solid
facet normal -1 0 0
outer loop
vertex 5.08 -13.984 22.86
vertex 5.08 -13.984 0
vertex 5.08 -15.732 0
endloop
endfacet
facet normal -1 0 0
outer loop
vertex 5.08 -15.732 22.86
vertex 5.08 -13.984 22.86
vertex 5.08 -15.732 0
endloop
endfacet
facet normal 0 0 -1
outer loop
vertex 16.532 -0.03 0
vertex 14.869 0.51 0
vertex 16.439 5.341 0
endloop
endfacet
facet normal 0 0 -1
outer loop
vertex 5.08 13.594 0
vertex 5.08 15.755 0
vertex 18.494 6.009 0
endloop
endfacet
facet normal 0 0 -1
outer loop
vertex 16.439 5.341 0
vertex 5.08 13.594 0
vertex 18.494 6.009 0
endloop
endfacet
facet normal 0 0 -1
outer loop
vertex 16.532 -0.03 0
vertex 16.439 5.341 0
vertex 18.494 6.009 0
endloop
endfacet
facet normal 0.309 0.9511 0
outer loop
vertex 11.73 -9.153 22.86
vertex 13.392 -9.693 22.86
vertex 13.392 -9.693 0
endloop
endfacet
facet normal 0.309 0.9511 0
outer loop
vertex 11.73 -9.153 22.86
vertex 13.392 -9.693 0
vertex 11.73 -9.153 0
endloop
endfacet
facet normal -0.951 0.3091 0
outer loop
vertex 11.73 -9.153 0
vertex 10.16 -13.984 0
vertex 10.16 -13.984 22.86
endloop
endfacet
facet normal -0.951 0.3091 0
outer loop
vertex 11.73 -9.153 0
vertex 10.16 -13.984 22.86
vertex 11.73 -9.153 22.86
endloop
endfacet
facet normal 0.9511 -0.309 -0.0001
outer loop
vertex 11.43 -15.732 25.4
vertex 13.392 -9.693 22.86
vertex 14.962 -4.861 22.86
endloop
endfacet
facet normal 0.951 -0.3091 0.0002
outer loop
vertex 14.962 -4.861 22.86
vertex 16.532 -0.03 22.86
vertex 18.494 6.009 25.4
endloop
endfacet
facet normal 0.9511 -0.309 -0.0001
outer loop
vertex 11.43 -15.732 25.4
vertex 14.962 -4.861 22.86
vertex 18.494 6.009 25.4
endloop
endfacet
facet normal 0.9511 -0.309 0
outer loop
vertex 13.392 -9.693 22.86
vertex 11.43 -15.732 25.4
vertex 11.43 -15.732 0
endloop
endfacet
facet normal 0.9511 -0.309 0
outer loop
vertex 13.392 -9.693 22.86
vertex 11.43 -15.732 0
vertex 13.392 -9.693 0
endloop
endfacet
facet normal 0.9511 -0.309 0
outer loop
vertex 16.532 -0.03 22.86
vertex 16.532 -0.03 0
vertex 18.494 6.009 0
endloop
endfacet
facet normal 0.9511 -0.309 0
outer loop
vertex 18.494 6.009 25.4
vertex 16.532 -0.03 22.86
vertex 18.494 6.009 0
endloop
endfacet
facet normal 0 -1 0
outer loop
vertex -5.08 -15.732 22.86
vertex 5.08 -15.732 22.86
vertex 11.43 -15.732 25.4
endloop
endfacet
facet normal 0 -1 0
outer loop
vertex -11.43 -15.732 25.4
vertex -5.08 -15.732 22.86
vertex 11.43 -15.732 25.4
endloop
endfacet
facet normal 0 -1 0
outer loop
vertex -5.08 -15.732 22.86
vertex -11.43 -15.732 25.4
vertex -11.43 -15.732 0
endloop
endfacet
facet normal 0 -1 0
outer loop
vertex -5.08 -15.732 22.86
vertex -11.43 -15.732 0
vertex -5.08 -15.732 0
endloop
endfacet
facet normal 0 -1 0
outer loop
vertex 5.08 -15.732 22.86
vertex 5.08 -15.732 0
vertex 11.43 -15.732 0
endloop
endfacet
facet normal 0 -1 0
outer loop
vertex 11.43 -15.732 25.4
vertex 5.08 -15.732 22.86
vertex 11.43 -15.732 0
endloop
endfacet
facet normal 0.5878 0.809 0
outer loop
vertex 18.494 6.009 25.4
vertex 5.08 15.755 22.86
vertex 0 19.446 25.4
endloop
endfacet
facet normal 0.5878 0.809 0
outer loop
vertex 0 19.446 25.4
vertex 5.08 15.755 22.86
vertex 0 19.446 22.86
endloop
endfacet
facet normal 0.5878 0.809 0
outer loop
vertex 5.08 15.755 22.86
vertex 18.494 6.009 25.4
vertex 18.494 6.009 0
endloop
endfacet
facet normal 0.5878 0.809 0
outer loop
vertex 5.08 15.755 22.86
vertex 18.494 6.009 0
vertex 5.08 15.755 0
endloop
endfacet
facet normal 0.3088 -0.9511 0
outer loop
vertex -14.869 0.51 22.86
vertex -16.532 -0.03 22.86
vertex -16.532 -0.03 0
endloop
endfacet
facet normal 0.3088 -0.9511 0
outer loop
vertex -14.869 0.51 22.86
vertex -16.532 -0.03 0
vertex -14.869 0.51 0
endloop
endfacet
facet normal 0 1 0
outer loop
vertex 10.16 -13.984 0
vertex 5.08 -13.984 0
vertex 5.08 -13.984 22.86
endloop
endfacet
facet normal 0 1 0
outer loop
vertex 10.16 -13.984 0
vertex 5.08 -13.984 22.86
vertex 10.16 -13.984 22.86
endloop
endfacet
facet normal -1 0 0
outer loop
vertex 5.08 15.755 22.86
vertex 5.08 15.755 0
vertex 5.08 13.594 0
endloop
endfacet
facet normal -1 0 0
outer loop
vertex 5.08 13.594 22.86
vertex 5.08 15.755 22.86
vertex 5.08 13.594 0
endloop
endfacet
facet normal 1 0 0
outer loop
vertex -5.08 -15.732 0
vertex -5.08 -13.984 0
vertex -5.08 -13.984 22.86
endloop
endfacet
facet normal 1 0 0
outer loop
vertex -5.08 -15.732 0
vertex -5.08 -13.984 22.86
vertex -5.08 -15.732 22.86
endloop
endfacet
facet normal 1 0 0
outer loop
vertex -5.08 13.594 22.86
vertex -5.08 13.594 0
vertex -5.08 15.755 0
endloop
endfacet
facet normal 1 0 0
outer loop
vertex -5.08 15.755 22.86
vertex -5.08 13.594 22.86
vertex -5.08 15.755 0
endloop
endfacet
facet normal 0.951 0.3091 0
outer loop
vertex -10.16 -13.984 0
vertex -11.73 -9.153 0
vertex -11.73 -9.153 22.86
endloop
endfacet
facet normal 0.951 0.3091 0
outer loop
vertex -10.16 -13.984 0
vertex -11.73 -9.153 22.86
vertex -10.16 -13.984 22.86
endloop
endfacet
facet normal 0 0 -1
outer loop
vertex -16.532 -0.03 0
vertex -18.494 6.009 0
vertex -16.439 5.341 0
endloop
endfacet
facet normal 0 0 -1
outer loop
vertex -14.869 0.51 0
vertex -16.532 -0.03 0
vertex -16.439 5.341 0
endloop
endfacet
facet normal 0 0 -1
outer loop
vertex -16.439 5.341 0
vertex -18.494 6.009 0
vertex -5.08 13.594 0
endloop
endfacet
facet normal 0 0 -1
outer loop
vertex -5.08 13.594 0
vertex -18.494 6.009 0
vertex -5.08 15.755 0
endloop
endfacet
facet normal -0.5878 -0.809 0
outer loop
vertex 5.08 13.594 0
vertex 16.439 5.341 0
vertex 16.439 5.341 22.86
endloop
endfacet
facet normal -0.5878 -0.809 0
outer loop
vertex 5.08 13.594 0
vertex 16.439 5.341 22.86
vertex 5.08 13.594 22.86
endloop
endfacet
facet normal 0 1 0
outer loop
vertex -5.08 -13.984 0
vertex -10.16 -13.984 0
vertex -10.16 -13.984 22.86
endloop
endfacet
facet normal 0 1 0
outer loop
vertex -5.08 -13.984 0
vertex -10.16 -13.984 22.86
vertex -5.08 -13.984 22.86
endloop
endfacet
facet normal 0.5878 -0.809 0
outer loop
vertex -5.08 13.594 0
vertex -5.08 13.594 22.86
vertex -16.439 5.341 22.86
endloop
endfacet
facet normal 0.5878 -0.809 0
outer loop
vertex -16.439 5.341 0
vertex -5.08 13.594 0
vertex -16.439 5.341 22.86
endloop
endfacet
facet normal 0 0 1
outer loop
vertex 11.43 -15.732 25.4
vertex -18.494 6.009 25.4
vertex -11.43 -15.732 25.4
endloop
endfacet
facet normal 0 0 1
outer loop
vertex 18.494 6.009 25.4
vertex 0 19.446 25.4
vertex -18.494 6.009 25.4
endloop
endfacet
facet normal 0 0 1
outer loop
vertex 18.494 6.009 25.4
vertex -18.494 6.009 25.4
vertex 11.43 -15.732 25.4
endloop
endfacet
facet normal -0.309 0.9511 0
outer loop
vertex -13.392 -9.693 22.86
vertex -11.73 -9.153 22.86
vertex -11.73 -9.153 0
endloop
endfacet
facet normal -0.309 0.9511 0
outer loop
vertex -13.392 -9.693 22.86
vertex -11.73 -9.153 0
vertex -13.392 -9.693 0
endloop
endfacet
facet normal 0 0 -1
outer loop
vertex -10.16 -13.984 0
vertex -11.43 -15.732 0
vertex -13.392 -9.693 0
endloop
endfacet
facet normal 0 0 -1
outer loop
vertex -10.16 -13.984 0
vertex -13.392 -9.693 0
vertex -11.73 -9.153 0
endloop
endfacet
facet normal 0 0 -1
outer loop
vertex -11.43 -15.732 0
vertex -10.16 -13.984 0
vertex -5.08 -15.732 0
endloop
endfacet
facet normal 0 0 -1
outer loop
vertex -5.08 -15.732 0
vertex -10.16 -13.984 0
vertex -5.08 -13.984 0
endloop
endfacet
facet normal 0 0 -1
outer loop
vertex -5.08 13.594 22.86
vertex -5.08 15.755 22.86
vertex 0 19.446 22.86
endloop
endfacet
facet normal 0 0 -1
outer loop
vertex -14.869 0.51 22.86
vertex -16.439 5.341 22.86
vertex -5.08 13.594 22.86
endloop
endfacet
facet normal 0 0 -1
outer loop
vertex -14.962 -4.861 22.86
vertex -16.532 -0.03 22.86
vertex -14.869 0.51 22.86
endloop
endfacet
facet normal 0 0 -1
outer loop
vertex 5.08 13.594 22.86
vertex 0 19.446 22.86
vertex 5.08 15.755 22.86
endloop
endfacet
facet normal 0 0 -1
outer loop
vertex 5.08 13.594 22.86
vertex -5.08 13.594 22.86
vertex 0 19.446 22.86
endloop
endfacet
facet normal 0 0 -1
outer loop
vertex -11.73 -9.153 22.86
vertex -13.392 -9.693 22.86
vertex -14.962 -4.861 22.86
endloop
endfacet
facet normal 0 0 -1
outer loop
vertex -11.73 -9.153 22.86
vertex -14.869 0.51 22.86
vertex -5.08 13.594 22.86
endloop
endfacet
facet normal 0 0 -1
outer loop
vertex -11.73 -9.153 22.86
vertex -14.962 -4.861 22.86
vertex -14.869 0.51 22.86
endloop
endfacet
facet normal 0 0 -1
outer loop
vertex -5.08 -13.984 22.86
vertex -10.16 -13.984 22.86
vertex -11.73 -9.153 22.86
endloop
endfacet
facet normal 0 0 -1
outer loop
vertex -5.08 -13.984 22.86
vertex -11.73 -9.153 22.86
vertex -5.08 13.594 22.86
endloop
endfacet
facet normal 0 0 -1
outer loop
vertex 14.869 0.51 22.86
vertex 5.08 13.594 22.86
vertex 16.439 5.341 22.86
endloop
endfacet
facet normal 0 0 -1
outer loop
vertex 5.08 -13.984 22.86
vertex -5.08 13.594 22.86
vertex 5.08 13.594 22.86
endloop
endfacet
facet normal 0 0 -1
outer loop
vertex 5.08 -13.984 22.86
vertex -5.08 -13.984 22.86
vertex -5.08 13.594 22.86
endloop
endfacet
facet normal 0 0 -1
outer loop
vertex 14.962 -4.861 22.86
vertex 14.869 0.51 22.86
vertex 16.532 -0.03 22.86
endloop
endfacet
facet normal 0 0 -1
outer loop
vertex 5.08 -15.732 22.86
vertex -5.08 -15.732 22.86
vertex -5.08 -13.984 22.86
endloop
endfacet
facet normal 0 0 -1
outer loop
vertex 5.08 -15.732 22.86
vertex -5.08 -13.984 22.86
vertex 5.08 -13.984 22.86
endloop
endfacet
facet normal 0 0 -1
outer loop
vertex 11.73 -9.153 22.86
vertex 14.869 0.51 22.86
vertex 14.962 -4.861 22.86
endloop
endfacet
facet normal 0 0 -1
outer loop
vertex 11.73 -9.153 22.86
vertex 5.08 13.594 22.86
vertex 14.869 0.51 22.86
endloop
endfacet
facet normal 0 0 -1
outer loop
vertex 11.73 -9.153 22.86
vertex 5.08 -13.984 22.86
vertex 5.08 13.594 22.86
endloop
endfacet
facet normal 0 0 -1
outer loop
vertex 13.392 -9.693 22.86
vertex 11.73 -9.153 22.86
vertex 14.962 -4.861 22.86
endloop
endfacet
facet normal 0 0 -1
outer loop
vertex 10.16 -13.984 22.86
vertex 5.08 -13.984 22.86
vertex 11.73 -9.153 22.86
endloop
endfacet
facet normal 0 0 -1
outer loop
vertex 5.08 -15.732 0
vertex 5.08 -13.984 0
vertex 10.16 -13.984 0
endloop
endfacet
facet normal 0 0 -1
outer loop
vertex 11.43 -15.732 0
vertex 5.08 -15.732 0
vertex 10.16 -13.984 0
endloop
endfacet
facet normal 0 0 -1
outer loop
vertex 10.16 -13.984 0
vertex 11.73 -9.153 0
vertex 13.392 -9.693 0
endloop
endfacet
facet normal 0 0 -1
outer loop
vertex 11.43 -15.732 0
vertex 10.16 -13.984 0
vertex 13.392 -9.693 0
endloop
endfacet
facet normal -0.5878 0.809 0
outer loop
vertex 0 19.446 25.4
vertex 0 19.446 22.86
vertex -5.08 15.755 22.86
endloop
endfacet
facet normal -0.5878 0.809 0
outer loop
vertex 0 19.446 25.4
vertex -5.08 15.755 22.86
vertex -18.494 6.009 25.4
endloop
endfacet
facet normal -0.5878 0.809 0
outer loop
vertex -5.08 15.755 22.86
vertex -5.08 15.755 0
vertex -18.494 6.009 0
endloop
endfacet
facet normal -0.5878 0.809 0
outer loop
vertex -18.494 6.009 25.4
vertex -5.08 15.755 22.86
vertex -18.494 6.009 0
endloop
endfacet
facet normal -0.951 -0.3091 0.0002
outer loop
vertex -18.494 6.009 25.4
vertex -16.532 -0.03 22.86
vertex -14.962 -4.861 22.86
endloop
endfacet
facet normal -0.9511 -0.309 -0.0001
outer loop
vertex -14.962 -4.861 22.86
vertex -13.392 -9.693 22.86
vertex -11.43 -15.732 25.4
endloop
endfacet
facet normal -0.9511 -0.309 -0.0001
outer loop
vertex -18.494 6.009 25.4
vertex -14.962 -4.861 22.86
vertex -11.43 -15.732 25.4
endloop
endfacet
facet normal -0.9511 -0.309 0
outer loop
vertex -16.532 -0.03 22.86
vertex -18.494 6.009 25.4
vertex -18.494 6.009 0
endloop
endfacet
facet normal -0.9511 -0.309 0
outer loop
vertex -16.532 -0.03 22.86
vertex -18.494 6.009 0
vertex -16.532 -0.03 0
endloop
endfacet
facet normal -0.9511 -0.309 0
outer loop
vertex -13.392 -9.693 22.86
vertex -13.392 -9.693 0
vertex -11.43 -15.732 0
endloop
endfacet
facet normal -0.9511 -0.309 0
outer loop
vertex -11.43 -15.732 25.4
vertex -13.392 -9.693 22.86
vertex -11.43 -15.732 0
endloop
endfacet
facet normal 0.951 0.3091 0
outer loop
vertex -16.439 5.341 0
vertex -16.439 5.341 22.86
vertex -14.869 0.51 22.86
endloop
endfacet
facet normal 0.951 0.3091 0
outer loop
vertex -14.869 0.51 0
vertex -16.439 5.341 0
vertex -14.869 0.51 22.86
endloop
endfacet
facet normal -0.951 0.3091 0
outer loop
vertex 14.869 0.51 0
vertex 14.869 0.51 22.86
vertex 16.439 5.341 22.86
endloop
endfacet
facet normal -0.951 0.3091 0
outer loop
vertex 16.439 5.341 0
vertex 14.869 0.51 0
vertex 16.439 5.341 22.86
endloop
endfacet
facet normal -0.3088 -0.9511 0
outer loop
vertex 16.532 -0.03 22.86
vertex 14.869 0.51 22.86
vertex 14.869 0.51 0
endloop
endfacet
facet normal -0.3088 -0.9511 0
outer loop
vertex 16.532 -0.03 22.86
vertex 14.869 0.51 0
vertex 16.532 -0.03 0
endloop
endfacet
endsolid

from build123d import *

# Parameters (mm, degrees)
F1_DEPTH = 25.4
F3_DEPTH = 22.86
F4_W     = 10.16
F4_H     = 1.748005039
F5_DEPTH = 22.86


with BuildPart() as f1:
    # F0 (on Top) → F1 (new body)
    with BuildSketch(Plane.XY):
        Polygon((-11.43, -15.732045351), (11.43, -15.732045351), (18.4941284914, 6.0091066115), (0, 19.4458774789), (-18.4941284914, 6.0091066115), align=None)
    extrude(amount=F1_DEPTH)

    # F2 (on Top) → F3 (cut)
    with BuildSketch(Plane.XY):
        Polygon((10.16, -13.984040312), (16.4392253257, 5.3414280991), (0, 17.2852244257), (-16.4392253257, 5.3414280991), (-10.16, -13.984040312), align=None)
    extrude(amount=F3_DEPTH, mode=Mode.SUBTRACT)

    # F4 (on face) → F5 (cut)
    with BuildSketch(Plane(origin=(0, 0, 0), x_dir=(1, 0, 0), z_dir=(0, 0, -1))):
        Polygon((-14.8694189943, -0.5100609964), (-13.2996126628, 4.3213061064), (-14.9620642457, 4.8614693697), (-16.5318705771, 0.030102267), align=None)
        Polygon((-14.9620642457, 4.8614693697), (-13.2996126628, 4.3213061064), (-11.7298063314, 9.1526732092), (-13.3922579143, 9.6928364725), align=None)
        Polygon((11.7298063314, 9.1526732092), (13.2996126628, 4.3213061064), (14.9620642457, 4.8614693697), (13.3922579143, 9.6928364725), align=None)
        Polygon((14.9620642457, 4.8614693697), (13.2996126628, 4.3213061064), (14.8694189943, -0.5100609964), (16.5318705771, 0.030102267), align=None)
        Polygon((0, -19.4458774789), (0, -17.2852244257), (-5.08, -13.5943883834), (-5.08, -15.7550414367), align=None)
        Polygon((5.08, -13.5943883834), (0, -17.2852244257), (0, -19.4458774789), (5.08, -15.7550414367), align=None)
        with Locations((0, 14.8580428315)):
            Rectangle(F4_W, F4_H)
    extrude(amount=-F5_DEPTH, mode=Mode.SUBTRACT)


solid = f1.part
